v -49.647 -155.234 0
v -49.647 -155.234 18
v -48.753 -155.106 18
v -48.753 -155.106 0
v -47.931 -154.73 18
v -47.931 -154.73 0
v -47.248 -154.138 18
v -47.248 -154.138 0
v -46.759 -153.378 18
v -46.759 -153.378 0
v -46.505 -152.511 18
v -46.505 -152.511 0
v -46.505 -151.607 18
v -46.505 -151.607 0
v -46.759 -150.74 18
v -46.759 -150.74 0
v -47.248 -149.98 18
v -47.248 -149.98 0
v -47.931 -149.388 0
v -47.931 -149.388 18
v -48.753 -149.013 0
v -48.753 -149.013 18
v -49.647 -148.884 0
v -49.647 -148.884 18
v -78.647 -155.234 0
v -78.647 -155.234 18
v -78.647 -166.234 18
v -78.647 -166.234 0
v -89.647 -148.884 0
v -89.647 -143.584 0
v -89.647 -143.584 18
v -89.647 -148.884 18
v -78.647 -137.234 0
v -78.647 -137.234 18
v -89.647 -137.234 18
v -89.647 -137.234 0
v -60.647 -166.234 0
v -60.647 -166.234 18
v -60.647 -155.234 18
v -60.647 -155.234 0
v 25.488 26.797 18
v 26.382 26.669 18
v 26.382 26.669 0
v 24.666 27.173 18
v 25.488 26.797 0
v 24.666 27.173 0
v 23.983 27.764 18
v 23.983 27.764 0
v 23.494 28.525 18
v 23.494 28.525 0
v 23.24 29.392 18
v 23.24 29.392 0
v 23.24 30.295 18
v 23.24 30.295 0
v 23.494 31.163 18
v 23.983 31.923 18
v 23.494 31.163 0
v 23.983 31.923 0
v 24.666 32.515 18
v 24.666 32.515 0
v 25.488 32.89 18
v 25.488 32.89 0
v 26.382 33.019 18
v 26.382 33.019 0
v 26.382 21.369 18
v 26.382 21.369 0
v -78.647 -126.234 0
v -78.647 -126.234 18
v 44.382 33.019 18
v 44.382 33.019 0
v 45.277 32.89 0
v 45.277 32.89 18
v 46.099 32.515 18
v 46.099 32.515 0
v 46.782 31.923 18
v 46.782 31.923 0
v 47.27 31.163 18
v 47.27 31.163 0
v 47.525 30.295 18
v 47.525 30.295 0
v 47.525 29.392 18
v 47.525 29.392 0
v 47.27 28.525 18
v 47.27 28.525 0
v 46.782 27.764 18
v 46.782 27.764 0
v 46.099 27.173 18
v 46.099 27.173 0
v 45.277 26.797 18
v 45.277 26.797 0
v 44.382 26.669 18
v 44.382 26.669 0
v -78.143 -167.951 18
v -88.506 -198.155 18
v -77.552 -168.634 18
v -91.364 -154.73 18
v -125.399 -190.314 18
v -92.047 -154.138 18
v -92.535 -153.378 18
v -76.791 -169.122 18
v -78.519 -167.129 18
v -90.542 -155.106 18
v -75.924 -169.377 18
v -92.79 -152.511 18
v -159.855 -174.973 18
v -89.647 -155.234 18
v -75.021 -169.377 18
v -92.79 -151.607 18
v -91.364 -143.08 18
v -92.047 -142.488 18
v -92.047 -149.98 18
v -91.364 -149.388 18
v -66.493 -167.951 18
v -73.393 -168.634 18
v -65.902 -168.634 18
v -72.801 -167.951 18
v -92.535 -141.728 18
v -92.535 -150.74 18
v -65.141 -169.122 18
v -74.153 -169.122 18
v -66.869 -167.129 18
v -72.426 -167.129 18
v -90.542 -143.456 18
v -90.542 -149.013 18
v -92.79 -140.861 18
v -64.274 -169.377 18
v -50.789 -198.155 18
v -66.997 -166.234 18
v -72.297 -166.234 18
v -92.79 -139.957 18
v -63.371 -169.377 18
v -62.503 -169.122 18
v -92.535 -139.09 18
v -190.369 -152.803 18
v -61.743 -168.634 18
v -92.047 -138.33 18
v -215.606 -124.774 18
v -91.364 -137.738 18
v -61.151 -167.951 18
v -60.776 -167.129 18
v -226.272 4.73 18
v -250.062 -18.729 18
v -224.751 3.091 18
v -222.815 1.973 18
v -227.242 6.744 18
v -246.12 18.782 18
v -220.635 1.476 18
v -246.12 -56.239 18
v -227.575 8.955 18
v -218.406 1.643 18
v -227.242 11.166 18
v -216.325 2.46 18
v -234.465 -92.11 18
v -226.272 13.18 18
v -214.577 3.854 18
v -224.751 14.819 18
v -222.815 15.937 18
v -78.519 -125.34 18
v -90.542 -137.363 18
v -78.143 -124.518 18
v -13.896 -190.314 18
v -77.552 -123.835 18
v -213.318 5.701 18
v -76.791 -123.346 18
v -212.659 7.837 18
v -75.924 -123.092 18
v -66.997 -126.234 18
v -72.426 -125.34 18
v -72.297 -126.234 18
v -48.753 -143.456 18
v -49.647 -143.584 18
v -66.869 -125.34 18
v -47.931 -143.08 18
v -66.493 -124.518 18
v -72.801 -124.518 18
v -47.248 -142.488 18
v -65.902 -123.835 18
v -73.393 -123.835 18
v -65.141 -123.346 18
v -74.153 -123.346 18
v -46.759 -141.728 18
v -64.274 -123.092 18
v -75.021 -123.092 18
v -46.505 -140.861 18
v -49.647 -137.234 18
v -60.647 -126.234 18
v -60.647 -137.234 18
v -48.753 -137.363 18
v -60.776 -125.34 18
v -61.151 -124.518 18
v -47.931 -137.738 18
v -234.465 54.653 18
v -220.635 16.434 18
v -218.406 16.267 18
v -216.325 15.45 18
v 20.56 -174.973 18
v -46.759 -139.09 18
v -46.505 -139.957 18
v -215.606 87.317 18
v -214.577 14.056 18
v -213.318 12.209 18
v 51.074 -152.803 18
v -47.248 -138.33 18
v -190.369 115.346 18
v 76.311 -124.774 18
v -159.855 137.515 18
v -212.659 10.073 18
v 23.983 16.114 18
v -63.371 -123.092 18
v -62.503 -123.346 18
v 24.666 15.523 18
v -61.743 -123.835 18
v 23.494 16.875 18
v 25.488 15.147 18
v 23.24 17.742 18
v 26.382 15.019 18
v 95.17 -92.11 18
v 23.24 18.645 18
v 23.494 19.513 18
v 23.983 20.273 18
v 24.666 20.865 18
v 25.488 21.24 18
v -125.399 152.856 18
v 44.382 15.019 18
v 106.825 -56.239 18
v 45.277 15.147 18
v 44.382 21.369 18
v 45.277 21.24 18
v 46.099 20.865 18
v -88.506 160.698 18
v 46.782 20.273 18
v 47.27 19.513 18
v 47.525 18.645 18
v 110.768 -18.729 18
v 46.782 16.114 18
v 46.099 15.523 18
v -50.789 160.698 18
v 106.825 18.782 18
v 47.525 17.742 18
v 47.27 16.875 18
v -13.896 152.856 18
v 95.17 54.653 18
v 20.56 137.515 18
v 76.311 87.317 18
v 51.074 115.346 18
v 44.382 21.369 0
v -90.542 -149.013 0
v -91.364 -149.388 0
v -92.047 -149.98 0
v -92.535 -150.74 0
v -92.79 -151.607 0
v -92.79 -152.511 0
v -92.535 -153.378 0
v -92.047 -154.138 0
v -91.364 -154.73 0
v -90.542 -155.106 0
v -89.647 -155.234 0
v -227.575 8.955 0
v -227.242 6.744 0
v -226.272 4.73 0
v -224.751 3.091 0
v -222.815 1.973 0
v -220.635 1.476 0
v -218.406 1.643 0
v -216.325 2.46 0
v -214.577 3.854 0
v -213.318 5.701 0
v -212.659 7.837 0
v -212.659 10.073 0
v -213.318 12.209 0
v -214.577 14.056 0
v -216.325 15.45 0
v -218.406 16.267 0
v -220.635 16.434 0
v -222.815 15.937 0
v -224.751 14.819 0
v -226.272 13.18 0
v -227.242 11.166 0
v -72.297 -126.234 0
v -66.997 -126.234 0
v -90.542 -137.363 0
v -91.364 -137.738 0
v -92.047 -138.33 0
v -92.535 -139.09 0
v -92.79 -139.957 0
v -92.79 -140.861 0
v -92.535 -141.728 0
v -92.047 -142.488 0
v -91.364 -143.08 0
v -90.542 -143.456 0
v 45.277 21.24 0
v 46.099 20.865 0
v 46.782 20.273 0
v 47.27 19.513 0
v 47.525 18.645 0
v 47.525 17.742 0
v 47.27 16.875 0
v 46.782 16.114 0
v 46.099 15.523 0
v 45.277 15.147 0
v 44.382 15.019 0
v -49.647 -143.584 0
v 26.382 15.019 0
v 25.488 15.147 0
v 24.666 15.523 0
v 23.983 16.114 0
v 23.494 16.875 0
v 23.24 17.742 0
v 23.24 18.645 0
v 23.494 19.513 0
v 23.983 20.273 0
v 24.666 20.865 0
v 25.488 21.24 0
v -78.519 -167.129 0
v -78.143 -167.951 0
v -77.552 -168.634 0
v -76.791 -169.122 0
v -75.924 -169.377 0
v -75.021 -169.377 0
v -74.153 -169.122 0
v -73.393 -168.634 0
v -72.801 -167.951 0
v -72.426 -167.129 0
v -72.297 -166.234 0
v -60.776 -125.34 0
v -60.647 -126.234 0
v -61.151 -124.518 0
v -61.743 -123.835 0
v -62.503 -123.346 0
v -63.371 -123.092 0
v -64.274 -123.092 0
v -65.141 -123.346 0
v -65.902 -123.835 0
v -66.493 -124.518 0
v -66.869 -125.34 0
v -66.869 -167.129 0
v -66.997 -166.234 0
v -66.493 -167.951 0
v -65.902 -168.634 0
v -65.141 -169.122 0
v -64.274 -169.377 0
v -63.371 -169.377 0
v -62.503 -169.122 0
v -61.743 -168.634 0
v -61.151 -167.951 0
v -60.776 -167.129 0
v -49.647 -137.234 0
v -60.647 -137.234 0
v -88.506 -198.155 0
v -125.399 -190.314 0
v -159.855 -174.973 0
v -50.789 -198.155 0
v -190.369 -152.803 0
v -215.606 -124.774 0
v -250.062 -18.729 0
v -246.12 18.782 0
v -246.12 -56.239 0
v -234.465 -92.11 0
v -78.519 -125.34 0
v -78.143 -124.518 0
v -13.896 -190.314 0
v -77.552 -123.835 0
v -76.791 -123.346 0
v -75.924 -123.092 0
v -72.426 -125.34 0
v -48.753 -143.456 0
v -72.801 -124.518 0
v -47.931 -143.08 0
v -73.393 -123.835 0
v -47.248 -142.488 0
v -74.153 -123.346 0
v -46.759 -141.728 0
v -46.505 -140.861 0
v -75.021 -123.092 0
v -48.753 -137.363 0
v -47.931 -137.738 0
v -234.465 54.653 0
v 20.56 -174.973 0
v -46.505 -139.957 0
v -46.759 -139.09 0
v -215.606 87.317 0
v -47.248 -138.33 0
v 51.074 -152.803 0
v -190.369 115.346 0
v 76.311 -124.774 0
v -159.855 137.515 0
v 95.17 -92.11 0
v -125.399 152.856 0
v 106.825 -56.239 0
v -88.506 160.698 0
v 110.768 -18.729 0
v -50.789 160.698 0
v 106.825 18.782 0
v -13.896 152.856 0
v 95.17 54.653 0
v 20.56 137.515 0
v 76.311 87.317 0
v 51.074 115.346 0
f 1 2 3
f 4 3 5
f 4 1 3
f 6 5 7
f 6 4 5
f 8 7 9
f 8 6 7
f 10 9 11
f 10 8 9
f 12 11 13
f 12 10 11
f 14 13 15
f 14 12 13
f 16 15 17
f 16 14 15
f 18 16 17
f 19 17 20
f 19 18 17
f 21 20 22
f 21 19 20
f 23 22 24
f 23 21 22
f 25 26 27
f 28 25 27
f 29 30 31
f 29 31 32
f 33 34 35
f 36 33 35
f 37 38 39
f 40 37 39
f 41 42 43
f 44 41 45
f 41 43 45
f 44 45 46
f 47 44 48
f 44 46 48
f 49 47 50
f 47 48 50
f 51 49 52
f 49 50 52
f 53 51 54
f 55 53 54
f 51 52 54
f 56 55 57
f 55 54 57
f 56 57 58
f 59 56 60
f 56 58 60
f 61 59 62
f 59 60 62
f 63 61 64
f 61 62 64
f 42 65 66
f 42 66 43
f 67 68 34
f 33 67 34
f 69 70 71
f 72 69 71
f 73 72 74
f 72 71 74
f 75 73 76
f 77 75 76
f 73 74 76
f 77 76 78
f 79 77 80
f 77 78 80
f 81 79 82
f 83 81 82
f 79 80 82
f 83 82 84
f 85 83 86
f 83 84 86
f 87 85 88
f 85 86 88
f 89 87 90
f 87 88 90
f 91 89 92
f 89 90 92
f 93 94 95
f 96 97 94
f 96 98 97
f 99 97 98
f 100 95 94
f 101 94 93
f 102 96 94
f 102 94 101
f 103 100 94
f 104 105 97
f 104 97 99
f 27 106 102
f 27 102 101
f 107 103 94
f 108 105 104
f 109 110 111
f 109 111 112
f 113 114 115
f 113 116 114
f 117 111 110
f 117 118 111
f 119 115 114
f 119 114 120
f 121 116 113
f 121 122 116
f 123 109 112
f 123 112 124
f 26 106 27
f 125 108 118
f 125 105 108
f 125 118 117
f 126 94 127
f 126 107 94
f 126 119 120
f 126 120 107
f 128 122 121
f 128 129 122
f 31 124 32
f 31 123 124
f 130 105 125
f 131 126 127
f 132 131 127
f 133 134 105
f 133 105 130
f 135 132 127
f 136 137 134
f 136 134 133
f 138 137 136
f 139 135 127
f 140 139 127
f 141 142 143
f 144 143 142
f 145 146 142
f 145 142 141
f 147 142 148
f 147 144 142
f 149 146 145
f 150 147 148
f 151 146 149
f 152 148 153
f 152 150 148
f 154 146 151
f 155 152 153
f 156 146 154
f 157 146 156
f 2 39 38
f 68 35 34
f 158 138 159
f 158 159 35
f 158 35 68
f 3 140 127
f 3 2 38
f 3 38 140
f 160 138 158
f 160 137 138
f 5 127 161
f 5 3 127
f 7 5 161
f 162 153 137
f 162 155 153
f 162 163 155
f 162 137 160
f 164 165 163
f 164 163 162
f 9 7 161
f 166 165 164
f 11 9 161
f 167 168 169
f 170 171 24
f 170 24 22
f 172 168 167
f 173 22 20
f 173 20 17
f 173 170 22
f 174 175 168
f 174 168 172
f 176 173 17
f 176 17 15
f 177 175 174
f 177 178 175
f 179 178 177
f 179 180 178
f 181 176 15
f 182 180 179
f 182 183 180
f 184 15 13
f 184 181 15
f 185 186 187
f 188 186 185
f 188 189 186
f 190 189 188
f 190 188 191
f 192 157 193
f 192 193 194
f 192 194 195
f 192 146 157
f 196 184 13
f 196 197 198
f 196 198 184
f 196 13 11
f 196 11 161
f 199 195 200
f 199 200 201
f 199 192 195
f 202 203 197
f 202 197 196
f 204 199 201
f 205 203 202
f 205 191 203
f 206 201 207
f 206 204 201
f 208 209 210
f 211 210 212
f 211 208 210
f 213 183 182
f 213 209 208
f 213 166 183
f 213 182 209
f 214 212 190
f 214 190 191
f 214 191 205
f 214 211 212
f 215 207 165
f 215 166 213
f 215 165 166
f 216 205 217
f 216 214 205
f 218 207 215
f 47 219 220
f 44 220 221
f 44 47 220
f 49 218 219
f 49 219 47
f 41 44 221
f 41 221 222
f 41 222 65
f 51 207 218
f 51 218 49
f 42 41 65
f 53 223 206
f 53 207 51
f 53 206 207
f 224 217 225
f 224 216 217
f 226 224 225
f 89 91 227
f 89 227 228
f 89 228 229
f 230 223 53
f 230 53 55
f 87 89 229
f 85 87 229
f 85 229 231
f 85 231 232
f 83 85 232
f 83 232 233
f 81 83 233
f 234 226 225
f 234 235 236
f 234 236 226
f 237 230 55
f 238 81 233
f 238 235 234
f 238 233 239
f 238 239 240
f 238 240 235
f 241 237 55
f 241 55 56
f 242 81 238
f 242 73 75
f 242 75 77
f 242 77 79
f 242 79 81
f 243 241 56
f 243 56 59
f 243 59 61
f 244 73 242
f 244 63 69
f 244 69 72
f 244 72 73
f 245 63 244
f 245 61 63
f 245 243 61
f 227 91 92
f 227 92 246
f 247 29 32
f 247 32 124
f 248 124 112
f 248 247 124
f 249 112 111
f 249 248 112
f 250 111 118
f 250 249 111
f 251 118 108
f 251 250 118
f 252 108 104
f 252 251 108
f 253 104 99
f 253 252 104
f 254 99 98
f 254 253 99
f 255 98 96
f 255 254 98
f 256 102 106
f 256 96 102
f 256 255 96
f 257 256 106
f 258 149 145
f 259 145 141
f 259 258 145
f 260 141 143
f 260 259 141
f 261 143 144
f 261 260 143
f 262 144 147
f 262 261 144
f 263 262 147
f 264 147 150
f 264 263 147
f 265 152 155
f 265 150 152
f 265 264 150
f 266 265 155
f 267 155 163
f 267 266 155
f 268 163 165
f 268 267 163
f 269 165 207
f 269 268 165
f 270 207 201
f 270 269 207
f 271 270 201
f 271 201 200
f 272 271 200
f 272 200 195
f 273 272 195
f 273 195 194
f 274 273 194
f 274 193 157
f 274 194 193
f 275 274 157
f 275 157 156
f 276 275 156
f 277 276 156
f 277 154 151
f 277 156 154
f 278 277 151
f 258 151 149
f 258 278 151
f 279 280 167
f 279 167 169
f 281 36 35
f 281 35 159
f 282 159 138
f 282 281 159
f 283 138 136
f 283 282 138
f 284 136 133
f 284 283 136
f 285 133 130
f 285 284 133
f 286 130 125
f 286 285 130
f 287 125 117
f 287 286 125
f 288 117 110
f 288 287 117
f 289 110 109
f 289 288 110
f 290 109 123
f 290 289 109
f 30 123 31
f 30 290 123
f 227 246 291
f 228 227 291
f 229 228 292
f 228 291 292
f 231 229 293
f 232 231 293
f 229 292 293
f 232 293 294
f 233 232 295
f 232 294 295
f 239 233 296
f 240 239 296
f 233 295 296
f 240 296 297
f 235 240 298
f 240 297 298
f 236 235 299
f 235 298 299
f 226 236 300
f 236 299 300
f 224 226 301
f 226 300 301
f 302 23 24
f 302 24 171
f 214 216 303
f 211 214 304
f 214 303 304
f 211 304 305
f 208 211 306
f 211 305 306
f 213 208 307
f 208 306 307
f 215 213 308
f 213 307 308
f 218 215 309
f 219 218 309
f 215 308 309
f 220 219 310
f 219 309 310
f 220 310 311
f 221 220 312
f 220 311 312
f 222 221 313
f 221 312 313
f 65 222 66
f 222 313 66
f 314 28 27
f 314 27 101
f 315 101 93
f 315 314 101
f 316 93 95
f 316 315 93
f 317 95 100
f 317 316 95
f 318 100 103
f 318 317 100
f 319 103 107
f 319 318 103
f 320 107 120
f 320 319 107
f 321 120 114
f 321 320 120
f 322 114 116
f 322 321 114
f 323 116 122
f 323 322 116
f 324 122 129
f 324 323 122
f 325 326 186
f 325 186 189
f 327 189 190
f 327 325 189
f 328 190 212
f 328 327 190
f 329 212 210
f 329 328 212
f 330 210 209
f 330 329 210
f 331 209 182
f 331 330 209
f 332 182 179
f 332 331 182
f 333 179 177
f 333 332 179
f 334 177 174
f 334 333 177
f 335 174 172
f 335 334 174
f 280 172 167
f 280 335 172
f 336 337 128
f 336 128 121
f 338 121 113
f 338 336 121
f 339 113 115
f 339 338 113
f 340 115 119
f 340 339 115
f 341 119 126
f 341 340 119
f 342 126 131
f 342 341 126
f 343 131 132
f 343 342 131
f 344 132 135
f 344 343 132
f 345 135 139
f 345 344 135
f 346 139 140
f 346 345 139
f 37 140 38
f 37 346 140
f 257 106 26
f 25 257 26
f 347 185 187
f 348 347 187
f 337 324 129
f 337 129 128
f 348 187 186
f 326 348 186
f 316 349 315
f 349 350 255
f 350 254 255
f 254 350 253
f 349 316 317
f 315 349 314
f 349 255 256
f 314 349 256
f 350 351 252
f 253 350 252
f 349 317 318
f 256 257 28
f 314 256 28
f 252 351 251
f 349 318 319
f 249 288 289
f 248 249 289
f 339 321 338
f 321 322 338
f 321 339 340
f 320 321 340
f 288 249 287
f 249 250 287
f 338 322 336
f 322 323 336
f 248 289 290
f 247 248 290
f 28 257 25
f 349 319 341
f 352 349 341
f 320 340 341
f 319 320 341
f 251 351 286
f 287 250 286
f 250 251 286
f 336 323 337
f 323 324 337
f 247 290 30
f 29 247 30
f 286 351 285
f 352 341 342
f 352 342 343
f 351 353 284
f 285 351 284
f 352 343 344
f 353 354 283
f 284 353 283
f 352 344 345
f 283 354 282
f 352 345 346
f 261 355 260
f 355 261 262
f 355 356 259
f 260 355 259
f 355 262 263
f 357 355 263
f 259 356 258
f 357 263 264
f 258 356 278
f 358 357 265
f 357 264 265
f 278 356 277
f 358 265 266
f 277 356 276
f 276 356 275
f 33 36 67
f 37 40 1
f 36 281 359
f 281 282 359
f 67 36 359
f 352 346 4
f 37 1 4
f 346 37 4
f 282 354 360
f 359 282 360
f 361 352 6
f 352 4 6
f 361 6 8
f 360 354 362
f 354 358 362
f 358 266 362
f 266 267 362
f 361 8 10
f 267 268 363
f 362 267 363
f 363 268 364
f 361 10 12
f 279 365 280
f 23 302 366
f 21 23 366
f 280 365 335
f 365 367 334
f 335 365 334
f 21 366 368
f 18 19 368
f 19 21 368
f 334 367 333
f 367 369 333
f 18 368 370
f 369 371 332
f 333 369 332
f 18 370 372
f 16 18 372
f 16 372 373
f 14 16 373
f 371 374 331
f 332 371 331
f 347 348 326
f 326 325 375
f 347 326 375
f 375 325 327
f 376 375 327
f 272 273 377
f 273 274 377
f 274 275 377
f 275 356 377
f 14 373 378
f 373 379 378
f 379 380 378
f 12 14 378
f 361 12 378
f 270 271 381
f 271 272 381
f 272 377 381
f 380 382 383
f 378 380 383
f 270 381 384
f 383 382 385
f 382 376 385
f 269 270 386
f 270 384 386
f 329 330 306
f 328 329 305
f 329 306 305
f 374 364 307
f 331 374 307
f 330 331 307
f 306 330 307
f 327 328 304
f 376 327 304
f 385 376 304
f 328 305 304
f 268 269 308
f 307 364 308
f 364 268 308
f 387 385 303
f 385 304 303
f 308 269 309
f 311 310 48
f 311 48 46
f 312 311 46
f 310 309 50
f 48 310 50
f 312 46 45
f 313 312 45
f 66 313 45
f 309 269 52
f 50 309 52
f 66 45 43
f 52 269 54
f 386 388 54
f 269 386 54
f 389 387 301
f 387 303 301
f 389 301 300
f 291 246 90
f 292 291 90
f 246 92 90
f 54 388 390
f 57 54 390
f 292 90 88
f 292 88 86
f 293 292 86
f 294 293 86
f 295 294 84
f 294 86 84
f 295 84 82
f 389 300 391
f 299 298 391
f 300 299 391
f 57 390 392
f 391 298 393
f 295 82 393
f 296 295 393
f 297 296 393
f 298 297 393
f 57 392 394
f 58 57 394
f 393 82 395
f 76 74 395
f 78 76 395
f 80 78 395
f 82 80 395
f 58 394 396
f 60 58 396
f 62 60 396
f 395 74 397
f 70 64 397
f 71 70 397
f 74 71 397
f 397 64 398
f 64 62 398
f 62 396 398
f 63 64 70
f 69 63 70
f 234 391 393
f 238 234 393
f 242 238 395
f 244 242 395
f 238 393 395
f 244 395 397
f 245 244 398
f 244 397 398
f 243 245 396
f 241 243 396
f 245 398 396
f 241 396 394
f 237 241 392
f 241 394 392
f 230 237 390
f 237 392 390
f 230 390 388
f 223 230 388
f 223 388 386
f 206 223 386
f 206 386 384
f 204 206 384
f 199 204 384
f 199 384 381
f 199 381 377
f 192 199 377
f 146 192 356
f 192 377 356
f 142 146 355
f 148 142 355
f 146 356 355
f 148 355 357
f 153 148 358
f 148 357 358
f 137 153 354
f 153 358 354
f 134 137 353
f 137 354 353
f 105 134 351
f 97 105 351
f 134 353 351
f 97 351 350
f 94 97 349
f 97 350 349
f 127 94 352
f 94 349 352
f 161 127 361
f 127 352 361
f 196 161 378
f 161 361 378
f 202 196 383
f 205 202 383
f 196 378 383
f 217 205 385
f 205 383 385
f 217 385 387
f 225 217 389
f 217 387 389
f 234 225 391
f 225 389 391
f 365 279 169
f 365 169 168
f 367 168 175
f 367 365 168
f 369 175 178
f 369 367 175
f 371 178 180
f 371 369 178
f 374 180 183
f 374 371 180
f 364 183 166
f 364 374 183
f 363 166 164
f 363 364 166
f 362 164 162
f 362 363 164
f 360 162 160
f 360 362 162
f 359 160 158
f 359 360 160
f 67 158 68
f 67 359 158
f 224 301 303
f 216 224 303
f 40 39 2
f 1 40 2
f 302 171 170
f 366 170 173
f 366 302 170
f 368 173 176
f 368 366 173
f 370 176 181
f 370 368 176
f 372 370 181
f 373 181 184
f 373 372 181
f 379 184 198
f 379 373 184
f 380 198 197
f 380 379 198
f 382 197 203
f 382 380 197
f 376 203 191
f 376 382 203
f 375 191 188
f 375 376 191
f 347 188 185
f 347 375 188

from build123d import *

# Parameters (mm, degrees)
SCHIZZO1_R                   = 180.415
ESTRUSIONE_ESTRUSIONE1_DEPTH = 18
TAGLIO_ESTRUSIONE1_DEPTH     = 48
SCHIZZO1_18_R                = 7.5
TAGLIO_ESTRUSIONE2_DEPTH     = 80
TAGLIO_ESTRUSIONE3_DEPTH     = 135


with BuildPart() as part:
    # Schizzo1 → Estrusione-Estrusione1 (new body)
    with BuildSketch(Plane.XY):
        with Locations((-69.647392192, -18.728644796)):
            Circle(SCHIZZO1_R)
    extrude(amount=ESTRUSIONE_ESTRUSIONE1_DEPTH)

    # Schizzo1<17> → Taglio-Estrusione1 (cut)
    with BuildSketch(Plane.XY):
        with BuildLine():
            Line((44.382329363, 15.018559966), (26.382329363, 15.018559966))
            ThreePointArc((26.382329363, 15.018559966), (23.207329363, 18.193559966), (26.382329363, 21.368559966))
            Line((26.382329363, 21.368559966), (26.382329363, 26.668559966))
            ThreePointArc((26.382329363, 26.668559966), (23.207329363, 29.843559966), (26.382329363, 33.018559966))
            Line((26.382329363, 33.018559966), (44.382329363, 33.018559966))
            ThreePointArc((44.382329363, 33.018559966), (47.557329363, 29.843559966), (44.382329363, 26.668559966))
            Line((44.382329363, 26.668559966), (44.382329363, 21.368559966))
            ThreePointArc((44.382329363, 21.368559966), (47.557329363, 18.193559966), (44.382329363, 15.018559966))
        make_face()
    extrude(amount=TAGLIO_ESTRUSIONE1_DEPTH, mode=Mode.SUBTRACT)

    # Schizzo1<18> → Taglio-Estrusione2 (cut)
    with BuildSketch(Plane.XY):
        with Locations((-220.074947502, 8.955026171)):
            Circle(SCHIZZO1_18_R)
    extrude(amount=TAGLIO_ESTRUSIONE2_DEPTH, mode=Mode.SUBTRACT)

    # Schizzo1<19> → Taglio-Estrusione3 (cut)
    with BuildSketch(Plane.XY):
        with BuildLine():
            Line((-66.997392192, -126.234256826), (-72.297392192, -126.234256826))
            ThreePointArc((-72.297392192, -126.234256826), (-75.472392192, -123.059256826), (-78.647392192, -126.234256826))
            Line((-78.647392192, -126.234256826), (-78.647392192, -137.234256826))
            Line((-78.647392192, -137.234256826), (-89.647392192, -137.234256826))
            ThreePointArc((-89.647392192, -137.234256826), (-92.822392192, -140.409256826), (-89.647392192, -143.584256826))
            Line((-89.647392192, -143.584256826), (-89.647392192, -148.884256826))
            ThreePointArc((-89.647392192, -148.884256826), (-92.822392192, -152.059256826), (-89.647392192, -155.234256826))
            Line((-89.647392192, -155.234256826), (-78.647392192, -155.234256826))
            Line((-78.647392192, -155.234256826), (-78.647392192, -166.234256826))
            ThreePointArc((-78.647392192, -166.234256826), (-75.472392192, -169.409256826), (-72.297392192, -166.234256826))
            Line((-72.297392192, -166.234256826), (-66.997392192, -166.234256826))
            ThreePointArc((-66.997392192, -166.234256826), (-63.822392192, -169.409256826), (-60.647392192, -166.234256826))
            Line((-60.647392192, -166.234256826), (-60.647392192, -155.234256826))
            Line((-60.647392192, -155.234256826), (-49.647392192, -155.234256826))
            ThreePointArc((-49.647392192, -155.234256826), (-46.472392192, -152.059256826), (-49.647392192, -148.884256826))
            Line((-49.647392192, -148.884256826), (-49.647392192, -143.584256826))
            ThreePointArc((-49.647392192, -143.584256826), (-46.472392192, -140.409256826), (-49.647392192, -137.234256826))
            Line((-49.647392192, -137.234256826), (-60.647392192, -137.234256826))
            Line((-60.647392192, -137.234256826), (-60.647392192, -126.234256826))
            ThreePointArc((-60.647392192, -126.234256826), (-63.822392192, -123.059256826), (-66.997392192, -126.234256826))
        make_face()
    extrude(amount=TAGLIO_ESTRUSIONE3_DEPTH, mode=Mode.SUBTRACT)


solid = part.part
